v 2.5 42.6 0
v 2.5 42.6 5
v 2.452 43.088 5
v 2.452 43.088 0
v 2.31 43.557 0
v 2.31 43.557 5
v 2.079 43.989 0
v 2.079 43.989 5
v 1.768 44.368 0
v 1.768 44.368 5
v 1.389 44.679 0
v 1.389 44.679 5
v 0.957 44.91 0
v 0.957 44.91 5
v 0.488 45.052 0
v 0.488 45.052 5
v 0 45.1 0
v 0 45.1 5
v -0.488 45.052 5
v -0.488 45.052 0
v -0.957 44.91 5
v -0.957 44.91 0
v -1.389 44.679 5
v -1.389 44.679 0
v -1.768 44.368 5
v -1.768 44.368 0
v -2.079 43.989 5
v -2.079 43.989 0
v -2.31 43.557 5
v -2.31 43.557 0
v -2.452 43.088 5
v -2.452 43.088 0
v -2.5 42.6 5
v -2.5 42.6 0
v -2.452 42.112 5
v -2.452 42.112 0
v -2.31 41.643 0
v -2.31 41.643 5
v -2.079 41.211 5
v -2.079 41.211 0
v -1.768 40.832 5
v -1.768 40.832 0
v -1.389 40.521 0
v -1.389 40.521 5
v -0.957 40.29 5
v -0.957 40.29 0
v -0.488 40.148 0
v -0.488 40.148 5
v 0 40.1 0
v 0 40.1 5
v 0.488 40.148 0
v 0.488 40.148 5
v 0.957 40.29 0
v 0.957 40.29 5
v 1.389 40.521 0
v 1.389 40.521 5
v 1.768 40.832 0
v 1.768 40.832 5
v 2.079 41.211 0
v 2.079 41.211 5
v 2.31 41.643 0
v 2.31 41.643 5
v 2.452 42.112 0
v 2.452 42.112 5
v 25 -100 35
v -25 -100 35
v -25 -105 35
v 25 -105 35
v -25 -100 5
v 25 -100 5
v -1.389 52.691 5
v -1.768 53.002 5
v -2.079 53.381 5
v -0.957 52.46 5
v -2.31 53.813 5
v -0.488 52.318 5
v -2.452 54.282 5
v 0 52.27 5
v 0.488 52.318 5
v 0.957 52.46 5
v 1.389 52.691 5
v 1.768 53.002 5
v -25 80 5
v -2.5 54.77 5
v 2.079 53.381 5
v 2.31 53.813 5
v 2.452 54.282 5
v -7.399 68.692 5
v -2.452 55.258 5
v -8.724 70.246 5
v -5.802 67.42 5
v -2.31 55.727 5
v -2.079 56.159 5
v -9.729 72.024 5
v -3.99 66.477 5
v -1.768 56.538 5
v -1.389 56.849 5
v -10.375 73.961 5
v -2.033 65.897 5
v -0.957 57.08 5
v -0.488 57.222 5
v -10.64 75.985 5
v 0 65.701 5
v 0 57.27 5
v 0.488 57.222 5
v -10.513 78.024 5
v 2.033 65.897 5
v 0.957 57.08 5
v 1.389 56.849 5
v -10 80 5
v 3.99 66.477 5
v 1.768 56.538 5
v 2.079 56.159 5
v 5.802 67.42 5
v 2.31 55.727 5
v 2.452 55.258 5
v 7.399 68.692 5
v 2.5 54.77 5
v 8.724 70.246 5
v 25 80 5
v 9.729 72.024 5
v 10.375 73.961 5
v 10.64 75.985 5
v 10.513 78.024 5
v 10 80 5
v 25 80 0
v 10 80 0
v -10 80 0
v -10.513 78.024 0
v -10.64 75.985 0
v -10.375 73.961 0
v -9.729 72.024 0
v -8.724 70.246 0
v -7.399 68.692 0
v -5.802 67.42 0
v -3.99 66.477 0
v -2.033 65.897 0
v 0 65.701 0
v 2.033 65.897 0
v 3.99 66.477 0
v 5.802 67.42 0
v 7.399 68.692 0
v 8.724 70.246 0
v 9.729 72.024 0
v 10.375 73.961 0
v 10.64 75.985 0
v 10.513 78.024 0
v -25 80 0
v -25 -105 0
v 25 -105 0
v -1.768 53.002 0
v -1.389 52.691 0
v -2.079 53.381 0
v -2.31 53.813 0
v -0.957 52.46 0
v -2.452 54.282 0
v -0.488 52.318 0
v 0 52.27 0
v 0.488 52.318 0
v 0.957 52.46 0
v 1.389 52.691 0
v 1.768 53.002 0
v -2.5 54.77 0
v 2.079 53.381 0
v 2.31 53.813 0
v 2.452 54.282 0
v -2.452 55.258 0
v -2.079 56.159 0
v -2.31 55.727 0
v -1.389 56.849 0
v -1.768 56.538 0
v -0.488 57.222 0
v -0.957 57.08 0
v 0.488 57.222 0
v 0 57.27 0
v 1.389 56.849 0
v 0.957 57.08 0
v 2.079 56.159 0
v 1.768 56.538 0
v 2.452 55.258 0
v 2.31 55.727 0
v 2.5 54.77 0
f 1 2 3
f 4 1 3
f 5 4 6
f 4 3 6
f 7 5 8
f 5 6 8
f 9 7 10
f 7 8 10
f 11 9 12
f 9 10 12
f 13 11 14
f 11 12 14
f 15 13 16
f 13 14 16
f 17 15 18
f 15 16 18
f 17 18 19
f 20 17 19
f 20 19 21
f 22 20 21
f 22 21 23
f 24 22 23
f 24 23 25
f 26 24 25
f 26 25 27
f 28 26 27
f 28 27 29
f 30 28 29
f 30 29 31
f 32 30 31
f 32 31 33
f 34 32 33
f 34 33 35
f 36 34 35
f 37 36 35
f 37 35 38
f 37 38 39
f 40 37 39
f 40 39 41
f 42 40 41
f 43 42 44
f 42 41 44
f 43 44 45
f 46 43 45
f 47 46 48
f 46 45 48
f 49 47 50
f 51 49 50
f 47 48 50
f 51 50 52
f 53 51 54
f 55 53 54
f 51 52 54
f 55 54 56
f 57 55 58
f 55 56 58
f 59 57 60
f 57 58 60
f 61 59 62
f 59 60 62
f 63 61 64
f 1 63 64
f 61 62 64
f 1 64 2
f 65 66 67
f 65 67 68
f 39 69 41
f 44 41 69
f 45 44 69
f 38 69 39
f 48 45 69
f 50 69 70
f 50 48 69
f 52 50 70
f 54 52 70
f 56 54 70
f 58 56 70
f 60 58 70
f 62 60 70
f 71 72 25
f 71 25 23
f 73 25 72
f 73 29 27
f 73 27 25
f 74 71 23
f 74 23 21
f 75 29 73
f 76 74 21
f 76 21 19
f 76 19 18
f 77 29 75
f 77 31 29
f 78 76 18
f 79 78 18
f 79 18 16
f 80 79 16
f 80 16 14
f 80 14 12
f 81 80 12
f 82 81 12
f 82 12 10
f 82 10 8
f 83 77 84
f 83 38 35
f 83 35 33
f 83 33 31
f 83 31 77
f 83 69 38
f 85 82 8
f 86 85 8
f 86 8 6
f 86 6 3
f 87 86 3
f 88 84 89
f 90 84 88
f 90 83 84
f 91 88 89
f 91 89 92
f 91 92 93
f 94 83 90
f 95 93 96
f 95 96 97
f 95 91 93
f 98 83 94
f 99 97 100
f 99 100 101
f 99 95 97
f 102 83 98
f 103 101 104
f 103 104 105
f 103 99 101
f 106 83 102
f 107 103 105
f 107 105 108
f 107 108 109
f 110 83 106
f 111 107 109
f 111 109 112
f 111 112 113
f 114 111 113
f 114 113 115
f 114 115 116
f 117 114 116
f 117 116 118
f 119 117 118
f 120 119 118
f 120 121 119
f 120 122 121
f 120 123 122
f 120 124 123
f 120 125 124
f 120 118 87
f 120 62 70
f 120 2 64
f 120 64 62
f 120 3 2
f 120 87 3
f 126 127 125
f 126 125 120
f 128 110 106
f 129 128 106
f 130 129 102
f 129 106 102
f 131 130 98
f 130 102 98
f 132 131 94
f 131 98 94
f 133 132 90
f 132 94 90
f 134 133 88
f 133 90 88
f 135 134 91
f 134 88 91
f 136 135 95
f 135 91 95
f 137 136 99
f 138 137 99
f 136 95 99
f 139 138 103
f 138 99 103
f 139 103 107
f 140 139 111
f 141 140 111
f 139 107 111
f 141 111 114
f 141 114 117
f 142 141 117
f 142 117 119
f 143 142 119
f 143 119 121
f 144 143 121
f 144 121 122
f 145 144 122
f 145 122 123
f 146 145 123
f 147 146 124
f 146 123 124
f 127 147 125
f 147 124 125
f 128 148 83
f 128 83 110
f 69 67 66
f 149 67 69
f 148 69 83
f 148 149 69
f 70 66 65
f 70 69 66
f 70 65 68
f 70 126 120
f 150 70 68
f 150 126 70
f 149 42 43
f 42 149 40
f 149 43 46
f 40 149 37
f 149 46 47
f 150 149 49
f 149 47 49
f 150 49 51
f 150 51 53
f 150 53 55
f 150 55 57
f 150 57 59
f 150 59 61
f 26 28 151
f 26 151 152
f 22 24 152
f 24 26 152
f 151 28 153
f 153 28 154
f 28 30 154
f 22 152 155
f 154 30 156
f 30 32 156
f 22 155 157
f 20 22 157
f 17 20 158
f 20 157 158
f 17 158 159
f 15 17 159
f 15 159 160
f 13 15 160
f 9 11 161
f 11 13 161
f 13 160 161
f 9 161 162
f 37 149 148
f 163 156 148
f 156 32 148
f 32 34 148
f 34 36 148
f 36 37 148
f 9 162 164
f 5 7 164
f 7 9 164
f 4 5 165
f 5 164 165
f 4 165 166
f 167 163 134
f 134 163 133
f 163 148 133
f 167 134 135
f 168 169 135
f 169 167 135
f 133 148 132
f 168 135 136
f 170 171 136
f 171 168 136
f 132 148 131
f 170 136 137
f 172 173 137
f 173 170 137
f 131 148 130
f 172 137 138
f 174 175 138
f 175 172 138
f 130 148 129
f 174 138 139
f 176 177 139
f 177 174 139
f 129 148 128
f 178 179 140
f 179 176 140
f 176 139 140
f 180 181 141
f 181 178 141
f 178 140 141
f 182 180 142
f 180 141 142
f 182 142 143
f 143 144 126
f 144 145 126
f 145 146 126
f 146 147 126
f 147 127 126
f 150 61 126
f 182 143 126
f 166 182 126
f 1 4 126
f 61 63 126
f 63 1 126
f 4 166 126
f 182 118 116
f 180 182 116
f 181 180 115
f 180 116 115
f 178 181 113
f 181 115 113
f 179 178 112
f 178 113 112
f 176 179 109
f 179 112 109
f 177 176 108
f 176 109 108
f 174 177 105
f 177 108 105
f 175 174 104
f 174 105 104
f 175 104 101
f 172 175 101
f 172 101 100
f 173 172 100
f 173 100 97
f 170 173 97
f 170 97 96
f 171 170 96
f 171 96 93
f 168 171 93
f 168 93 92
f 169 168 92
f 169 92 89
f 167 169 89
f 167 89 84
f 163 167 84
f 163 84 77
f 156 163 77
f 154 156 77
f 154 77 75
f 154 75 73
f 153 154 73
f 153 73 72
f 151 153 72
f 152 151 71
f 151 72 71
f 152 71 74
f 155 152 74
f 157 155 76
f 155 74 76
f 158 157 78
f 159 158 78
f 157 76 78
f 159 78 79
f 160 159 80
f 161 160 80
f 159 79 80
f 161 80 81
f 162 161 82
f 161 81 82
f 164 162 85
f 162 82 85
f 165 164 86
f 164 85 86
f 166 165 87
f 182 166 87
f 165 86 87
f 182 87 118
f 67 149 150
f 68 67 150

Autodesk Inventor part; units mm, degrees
ref_plane "YZ Plane" through (0, 0, 0) normal (1, 0, 0) x (0, 1, 0)
ref_plane "XZ Plane" through (0, 0, 0) normal (0, 1, 0) x (-1, 0, 0)
ref_plane "XY Plane" through (0, 0, 0) normal (0, 0, 1) x (1, 0, 0)
sketch "Sketch1" plane through (0, 0, 0) normal (0, 0, 1) x (1, 0, 0)
  line L0 (-25, -110) -> (-25, 110)
  line L1 (-25, 110) -> (25, 110)
  line L2 (25, 110) -> (25, -110)
  line L3 (25, -110) -> (-25, -110)
  line L4 (-25, -110) -> (25, 110) construction
  line L5 (-25, 110) -> (25, -110) construction
  line L6 (-25, -110) -> (-25, -105)
  line L7 (-25, -105) -> (25, -105)
  point P0 (0, 0)
  dimension "d0" = 220
  dimension "d1" = 50
  dimension "d2" = 5
extrude "Extrusion1" add sketch "Sketch1" along normal blind 5 contours L0 L1 L2 L7
sketch "Sketch2" plane through (0, 0, 5) normal (0, 0, 1) x (1, 0, 0)
  line L0 (-25, 110) -> (-25, -105) projected
  line L1 (-25, -105) -> (-25, -100)
  line L2 (-25, -100) -> (25, -100)
  line L3 (25, -105) -> (25, 110) projected
  line L4 (25, -100) -> (25, -105)
  line L5 (-25, -105) -> (25, -105) projected
  line L6 (-25, -105) -> (25, -105)
  point P0 (0, 0)
  dimension "d5" = 5
extrude "Extrusion2" add sketch "Sketch2" along normal blind 30
sketch "Sketch3" plane through (0, 0, 5) normal (0, 0, 1) x (1, 0, 0)
  line L0 (25, 110) -> (-25, 110) projected
  line L1 (0, 110) -> (-5, 110)
  line L2 (-5, 110) -> (5, 110)
  arc A0 (-5, 110) -> (5, 110) centre (0, 110) ccw
  point P0 (0, 0)
  dimension "d8" = 5
  dimension "d9" = 10
  dimension "d10" = 5
extrude "Extrusion3" cut sketch "Sketch3" against normal blind 30
ref_plane "Work Plane1" through (0, -105, 0) normal (1, 0, 0) x (0, 0, -1)
sketch "Sketch4" plane through (25, 110, 5) normal (0, 1, 0) x (1, 0, 0)
  line L0 (0, 0) -> (0, -30) projected
  line L1 (-50, 5) -> (-50, -30) projected
  line L2 (0, 0) -> (-50, 0)
  line L3 (-50, 0) -> (-50, 5)
  line L4 (-50, 5) -> (0, 5)
  line L5 (0, 5) -> (0, 0)
  point P0 (-25, 5)
extrude "Extrusion4" cut sketch "Sketch4" against normal blind 30
sketch "Sketch5" plane through (0, 0, 5) normal (0, 0, 1) x (1, 0, 0)
  line L0 (-25, 80) -> (25, 80) projected
  line L1 (0, 80) -> (-10, 80)
  line L2 (-10, 80) -> (10, 80)
  arc A0 (-10, 80) -> (10, 80) centre (0, 80) ccw
  point P0 (0, 0)
  dimension "d15" = 10
  dimension "d16" = 20
  dimension "d17" = 10
extrude "Extrusion5" cut sketch "Sketch5" against normal blind 30
sketch "Sketch6" plane through (0, 0, 5) normal (0, 0, 1) x (1, 0, 0)
  line L0 (0, 80) -> (0, 54.77)
  line L1 (0, 54.77) -> (0, 42.6)
  circle A0 centre (0, 54.77) radius 2.5
  circle A1 centre (0, 42.6) radius 2.5
  point P0 (0, 0)
  dimension "d20" = 25.23
  dimension "d21" = 12.17
  dimension "d22" = 5
  dimension "d23" = 5
extrude "Extrusion6" cut sketch "Sketch6" against normal blind 30
sketch "Sketch7" plane through (0, 0, 5) normal (0, 0, 1) x (1, 0, 0)
  arc A0 (-10, 80) -> (10, 80) centre (0, 80) ccw projected
  line L0 (10, 80) -> (25, 80) projected
  arc A1 (-10, 80) -> (10, 80) centre (0, 76.3471) ccw
  point P0 (0, 0)
extrude "Extrusion7" cut sketch "Sketch7" against normal blind 30
properties part number "Large Syring Mount"
